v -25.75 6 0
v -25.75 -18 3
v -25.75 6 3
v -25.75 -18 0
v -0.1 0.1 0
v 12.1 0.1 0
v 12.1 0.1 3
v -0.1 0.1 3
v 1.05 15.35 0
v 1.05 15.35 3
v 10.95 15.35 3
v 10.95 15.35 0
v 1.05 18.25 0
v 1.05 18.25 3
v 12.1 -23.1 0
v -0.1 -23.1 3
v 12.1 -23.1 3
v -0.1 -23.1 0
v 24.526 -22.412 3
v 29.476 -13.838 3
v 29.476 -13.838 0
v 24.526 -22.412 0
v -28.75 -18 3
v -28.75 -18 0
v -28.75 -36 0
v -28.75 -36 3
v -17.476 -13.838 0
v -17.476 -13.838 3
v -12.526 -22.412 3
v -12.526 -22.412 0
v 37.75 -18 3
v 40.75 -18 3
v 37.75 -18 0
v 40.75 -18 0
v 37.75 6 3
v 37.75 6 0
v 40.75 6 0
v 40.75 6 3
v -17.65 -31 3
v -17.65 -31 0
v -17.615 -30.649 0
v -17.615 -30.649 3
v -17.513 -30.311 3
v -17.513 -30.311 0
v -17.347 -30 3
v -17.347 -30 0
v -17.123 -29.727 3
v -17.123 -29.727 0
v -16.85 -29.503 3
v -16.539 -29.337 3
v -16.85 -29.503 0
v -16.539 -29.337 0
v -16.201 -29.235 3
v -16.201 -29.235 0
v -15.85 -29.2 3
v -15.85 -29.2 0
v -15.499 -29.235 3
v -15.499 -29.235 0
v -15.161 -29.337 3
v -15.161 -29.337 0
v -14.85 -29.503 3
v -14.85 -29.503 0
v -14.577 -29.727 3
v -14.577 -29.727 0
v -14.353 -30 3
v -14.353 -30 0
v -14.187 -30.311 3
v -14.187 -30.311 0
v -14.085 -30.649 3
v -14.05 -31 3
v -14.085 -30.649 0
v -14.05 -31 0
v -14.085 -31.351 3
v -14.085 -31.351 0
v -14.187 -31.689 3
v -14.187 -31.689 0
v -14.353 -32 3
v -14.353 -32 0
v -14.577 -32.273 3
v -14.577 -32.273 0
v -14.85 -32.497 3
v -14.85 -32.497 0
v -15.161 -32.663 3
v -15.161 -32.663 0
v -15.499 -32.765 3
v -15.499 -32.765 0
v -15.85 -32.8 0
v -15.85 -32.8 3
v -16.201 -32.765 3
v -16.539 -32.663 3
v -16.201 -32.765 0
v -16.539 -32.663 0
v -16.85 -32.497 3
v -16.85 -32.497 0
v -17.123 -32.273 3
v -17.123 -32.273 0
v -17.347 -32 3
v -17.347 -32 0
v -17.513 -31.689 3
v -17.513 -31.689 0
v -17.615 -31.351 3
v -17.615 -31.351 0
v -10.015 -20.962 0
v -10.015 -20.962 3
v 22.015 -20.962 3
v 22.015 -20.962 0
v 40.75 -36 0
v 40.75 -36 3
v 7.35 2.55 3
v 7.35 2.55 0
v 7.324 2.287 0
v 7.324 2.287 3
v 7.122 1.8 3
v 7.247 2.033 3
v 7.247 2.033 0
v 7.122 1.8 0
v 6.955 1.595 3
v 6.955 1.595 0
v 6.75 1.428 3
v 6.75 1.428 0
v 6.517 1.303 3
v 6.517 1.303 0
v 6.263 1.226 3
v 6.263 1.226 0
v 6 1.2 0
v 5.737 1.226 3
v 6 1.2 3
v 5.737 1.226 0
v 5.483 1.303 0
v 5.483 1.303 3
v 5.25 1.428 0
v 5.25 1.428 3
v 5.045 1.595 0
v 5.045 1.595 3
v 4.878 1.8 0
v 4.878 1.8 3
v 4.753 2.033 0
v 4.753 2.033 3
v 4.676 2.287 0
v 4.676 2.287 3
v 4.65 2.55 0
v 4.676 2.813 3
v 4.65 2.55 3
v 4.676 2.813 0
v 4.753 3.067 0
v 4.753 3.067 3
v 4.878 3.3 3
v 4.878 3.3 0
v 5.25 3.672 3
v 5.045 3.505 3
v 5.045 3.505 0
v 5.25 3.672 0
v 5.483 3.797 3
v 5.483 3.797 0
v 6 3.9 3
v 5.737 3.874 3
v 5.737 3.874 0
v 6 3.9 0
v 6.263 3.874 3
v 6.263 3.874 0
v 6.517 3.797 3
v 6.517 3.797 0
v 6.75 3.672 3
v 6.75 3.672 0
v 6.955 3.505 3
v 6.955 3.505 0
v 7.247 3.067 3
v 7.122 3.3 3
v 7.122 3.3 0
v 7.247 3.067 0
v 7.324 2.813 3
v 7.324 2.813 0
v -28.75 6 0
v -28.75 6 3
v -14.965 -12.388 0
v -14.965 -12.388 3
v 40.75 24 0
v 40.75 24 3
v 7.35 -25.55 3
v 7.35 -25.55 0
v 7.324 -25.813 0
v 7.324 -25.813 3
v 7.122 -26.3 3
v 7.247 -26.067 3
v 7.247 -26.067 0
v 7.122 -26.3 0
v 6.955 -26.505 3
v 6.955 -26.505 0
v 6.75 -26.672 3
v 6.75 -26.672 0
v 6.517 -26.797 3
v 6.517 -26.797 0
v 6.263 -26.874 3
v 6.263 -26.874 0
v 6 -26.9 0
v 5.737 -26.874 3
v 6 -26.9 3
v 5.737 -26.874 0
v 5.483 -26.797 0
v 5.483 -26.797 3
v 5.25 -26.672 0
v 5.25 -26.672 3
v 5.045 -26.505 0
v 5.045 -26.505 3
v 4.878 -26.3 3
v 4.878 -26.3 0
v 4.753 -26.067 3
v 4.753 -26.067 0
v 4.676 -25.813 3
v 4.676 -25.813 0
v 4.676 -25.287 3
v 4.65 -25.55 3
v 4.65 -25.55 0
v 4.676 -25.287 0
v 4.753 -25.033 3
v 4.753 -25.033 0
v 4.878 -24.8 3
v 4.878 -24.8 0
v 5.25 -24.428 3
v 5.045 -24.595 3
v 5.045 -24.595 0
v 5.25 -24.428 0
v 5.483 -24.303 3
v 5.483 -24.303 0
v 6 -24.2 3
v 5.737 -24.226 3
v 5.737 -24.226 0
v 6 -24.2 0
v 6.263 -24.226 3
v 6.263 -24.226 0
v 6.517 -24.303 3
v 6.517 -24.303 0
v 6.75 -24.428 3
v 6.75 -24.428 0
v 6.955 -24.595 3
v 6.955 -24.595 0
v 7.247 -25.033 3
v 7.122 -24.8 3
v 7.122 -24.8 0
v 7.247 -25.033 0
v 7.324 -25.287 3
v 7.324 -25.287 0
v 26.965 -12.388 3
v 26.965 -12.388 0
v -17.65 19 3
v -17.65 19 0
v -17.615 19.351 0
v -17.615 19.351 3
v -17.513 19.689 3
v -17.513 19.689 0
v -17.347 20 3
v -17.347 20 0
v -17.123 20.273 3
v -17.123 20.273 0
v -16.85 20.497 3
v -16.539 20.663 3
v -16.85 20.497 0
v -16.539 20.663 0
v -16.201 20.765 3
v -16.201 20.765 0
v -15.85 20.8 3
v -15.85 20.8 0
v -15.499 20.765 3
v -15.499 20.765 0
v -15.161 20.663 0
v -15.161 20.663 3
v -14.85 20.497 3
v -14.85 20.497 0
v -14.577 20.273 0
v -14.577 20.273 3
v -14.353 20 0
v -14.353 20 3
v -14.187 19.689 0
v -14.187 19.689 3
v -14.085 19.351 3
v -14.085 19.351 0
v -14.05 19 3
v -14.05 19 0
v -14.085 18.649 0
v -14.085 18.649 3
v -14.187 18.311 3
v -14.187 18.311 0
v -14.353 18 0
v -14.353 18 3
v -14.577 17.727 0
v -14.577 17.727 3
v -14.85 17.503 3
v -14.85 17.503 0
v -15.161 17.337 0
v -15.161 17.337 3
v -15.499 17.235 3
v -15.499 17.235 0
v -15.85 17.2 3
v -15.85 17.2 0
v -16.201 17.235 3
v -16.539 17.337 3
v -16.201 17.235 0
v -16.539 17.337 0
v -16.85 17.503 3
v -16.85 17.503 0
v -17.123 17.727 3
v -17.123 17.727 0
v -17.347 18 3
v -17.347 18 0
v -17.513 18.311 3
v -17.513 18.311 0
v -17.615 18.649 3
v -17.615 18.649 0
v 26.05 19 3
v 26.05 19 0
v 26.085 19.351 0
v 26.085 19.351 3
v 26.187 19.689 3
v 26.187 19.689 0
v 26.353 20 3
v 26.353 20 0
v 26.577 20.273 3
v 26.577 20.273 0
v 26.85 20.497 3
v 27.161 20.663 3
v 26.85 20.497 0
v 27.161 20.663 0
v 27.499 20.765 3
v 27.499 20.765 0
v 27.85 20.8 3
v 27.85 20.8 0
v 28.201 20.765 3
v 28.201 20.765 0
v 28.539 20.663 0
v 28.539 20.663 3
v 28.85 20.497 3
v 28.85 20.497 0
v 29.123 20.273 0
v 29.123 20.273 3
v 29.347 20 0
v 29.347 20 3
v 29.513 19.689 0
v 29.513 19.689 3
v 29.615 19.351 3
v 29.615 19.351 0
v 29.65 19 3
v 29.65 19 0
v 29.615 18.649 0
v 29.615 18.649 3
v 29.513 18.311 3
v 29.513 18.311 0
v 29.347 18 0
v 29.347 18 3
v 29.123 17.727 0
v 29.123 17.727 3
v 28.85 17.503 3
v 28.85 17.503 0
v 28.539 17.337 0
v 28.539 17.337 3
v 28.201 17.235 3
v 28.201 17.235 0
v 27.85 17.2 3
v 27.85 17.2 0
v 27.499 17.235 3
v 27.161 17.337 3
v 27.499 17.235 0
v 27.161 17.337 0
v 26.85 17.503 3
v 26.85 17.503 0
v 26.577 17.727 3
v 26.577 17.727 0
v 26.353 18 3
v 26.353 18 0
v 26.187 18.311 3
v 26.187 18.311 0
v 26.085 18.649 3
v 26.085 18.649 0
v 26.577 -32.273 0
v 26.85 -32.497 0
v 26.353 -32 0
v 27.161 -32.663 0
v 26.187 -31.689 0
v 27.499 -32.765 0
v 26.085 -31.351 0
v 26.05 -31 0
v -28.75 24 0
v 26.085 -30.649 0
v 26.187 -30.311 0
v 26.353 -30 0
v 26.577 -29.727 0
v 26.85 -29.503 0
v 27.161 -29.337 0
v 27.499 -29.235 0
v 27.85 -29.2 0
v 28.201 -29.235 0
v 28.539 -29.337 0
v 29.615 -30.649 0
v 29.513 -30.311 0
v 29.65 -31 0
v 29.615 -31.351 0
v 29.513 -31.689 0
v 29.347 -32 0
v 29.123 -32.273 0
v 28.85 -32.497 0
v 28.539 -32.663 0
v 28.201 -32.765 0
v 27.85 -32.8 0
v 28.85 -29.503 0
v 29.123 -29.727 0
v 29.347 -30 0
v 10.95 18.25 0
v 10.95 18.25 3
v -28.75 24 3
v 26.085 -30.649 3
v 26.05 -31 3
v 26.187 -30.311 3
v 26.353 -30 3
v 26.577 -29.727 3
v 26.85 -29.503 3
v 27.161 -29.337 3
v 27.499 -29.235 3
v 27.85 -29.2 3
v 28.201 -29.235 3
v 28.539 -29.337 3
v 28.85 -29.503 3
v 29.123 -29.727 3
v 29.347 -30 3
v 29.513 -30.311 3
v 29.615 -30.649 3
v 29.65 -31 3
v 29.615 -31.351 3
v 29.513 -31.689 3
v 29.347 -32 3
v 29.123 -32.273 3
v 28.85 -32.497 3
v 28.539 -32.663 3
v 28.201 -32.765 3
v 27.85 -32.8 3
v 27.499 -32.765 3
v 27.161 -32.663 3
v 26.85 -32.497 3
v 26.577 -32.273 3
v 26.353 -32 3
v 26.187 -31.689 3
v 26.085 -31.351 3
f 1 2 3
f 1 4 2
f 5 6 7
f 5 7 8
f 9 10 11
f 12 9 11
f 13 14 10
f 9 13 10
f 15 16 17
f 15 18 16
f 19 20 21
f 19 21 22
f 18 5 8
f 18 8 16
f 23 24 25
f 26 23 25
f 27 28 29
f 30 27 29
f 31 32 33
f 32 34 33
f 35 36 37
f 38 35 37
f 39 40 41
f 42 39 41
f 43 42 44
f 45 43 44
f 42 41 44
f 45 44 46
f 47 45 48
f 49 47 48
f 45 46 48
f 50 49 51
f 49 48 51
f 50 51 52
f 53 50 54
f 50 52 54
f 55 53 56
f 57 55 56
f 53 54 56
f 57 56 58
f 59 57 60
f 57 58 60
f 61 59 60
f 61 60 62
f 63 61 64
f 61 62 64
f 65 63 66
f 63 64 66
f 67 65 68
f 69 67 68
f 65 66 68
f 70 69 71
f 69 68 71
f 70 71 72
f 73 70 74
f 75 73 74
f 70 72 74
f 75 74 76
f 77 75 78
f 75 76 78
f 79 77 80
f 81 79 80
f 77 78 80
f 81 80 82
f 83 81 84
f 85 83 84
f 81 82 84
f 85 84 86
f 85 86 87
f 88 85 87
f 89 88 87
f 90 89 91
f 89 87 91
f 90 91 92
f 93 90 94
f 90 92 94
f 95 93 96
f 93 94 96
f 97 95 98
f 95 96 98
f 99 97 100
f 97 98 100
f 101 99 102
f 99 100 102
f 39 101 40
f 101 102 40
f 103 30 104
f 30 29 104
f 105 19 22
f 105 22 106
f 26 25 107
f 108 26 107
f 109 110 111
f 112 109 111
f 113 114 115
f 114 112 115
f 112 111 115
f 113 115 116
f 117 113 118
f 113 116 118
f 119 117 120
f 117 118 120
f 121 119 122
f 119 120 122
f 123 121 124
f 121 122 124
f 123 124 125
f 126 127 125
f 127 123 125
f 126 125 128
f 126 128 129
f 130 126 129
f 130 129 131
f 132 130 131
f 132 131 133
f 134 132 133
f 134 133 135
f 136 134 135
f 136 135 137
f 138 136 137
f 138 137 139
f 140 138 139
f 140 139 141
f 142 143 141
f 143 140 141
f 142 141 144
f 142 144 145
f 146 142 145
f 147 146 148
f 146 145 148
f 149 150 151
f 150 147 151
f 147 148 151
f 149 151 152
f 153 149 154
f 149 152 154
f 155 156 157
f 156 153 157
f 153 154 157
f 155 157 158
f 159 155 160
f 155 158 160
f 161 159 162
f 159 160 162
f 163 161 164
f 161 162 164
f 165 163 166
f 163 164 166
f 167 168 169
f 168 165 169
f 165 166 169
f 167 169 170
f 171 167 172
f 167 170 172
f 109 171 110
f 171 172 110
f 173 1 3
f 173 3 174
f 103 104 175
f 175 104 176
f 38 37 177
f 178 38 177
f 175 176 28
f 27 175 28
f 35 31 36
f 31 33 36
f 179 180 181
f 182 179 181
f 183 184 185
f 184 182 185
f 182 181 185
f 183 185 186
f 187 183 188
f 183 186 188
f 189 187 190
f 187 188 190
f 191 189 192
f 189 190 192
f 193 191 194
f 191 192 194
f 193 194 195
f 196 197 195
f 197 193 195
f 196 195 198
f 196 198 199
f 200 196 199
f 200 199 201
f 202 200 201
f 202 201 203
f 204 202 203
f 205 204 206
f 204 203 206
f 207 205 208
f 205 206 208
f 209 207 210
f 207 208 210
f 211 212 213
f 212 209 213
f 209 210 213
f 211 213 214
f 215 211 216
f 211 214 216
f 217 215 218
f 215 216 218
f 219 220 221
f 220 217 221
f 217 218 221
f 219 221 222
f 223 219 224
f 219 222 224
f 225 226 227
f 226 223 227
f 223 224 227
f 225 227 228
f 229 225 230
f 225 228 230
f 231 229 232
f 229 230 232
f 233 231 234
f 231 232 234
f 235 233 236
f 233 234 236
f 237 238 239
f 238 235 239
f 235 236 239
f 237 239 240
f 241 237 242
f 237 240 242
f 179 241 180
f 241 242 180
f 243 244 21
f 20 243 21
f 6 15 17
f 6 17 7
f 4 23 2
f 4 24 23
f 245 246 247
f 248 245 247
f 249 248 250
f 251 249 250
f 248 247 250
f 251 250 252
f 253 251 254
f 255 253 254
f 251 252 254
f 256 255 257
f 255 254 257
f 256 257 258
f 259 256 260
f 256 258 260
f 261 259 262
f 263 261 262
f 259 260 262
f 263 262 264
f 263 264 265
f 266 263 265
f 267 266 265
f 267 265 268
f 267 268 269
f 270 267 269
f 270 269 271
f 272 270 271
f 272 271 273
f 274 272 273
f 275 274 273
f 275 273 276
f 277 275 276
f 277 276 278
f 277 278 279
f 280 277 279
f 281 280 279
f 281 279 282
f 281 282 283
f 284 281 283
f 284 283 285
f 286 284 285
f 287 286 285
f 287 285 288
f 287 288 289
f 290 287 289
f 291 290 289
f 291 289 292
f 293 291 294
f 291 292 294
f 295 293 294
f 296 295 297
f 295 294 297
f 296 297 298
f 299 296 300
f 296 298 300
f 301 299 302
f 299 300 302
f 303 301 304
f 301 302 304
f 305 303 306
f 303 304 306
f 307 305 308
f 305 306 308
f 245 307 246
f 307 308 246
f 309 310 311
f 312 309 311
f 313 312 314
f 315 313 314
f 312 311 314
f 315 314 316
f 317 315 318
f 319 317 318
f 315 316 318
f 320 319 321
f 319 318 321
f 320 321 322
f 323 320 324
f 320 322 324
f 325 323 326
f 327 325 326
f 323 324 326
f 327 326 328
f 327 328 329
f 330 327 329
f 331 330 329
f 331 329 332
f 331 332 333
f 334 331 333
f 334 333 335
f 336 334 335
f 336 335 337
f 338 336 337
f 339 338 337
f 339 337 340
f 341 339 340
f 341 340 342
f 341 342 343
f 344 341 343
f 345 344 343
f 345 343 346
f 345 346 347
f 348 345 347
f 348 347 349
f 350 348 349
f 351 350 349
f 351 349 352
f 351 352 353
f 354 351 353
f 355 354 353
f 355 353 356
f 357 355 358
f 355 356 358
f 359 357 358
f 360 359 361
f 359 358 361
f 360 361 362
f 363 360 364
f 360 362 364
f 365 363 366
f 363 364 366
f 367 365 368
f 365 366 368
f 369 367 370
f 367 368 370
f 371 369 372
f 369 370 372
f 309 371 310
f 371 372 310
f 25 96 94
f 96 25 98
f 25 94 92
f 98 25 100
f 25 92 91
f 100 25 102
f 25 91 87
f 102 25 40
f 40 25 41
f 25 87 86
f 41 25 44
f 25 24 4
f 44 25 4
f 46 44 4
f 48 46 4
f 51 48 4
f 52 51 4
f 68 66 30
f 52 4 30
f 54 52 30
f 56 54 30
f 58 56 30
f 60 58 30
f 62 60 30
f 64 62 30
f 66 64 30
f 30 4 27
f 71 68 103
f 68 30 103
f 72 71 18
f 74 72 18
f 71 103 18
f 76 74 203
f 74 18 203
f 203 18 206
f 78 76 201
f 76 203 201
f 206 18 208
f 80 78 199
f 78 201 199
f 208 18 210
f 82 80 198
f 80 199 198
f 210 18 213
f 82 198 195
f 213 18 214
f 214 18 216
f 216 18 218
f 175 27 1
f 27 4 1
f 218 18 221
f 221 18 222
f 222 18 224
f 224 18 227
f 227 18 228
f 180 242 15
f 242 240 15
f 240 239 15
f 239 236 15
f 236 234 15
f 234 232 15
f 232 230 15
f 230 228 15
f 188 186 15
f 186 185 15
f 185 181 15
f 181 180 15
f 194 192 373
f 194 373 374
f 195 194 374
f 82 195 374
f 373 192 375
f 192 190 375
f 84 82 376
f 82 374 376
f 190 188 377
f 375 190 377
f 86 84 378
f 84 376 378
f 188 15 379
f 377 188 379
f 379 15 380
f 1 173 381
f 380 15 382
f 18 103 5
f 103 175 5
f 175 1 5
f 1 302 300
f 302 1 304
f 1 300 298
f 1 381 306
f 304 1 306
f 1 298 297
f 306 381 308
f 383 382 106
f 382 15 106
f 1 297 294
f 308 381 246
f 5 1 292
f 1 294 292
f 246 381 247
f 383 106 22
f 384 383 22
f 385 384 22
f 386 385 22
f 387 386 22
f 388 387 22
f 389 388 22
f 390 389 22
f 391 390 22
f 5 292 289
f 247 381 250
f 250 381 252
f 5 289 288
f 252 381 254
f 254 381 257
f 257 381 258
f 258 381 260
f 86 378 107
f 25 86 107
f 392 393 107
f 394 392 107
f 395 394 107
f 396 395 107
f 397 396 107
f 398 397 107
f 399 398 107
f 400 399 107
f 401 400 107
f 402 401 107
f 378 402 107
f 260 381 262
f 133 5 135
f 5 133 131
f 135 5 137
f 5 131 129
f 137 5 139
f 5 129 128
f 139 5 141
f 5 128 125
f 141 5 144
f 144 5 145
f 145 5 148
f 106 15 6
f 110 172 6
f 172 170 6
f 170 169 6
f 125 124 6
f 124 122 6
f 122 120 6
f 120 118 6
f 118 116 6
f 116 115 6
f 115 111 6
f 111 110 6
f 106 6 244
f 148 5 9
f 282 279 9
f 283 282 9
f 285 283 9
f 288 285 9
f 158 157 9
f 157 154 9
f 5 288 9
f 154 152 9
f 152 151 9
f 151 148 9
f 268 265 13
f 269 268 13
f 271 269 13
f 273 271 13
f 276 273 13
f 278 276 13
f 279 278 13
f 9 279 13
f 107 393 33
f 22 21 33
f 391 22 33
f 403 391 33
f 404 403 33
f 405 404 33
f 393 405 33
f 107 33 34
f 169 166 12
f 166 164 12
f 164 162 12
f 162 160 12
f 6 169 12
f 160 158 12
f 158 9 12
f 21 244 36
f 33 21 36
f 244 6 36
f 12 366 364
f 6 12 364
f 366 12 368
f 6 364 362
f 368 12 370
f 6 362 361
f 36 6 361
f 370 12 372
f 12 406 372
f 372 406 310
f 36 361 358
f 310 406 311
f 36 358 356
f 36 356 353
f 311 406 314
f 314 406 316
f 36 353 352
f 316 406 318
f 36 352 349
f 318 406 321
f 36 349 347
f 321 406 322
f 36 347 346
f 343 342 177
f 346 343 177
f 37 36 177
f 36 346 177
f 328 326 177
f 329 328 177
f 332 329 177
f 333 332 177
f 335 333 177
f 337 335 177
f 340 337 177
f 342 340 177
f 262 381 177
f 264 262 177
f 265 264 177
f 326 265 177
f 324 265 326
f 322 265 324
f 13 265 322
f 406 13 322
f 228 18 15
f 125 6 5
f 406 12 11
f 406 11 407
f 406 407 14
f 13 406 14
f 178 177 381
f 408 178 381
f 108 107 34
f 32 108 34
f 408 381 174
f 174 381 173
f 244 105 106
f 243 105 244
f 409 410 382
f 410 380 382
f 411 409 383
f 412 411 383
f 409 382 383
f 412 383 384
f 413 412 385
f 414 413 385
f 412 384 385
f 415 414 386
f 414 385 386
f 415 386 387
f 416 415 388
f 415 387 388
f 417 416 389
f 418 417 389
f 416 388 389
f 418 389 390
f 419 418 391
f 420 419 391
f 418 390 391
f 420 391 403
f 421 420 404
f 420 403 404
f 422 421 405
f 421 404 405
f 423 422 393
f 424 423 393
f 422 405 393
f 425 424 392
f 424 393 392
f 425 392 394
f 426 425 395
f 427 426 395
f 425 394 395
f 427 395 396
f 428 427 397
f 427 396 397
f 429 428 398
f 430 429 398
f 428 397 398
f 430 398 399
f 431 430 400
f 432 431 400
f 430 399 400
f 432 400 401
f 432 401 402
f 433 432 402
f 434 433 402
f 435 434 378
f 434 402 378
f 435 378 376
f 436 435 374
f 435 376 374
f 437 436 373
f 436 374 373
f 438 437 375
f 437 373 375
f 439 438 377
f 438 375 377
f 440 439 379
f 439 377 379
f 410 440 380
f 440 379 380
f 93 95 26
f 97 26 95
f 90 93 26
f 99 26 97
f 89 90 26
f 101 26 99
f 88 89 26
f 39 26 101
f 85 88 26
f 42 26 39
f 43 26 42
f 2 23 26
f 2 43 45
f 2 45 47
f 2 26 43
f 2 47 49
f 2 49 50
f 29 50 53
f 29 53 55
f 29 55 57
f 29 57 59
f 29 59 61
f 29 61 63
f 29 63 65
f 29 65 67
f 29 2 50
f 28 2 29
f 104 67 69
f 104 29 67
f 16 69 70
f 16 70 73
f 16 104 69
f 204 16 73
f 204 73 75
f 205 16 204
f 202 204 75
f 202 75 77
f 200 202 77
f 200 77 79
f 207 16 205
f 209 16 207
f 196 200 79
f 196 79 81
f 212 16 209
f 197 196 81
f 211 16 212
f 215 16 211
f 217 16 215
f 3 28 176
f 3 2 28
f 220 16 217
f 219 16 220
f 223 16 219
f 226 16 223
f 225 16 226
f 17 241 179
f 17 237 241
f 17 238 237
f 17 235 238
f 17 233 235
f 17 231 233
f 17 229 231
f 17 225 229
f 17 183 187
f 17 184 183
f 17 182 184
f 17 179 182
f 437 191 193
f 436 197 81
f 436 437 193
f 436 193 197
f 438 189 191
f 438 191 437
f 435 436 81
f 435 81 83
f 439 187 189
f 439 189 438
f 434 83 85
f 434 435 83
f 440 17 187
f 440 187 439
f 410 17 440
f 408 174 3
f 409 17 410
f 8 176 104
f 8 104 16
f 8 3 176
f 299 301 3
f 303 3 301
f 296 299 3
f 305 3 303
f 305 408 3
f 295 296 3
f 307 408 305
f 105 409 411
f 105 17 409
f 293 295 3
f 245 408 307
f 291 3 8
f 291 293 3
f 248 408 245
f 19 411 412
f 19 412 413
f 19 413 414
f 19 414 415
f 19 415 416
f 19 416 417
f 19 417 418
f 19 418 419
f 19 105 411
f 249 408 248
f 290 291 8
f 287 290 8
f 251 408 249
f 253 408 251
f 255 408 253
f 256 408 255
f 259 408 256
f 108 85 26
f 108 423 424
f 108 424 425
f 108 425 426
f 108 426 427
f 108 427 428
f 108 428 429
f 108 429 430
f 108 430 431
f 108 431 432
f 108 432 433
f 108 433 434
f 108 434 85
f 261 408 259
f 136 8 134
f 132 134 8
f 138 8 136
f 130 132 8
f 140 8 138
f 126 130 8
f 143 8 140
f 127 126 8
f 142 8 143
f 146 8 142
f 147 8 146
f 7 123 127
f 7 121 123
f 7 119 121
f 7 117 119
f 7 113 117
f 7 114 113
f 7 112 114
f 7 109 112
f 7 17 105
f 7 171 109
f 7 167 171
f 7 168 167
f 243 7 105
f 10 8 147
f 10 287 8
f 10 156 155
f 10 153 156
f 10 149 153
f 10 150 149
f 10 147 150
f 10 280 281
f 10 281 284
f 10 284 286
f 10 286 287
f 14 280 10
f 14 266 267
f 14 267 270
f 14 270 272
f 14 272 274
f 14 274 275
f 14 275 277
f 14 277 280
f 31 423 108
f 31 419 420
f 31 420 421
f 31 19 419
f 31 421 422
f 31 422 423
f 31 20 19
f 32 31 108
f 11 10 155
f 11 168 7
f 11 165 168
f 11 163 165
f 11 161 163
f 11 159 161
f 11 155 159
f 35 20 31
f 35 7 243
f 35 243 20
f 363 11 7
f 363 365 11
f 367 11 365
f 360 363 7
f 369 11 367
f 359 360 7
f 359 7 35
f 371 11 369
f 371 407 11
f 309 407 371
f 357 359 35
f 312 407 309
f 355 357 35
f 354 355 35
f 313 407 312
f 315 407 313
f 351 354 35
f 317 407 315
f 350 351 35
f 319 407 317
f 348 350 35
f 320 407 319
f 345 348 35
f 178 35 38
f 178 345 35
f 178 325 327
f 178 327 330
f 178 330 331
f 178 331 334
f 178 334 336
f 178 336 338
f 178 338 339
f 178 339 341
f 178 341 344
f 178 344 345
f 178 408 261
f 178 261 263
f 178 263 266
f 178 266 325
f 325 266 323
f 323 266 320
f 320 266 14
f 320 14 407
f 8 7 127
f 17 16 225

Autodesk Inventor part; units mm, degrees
ref_plane "YZ Plane" through (0, 0, 0) normal (1, 0, 0) x (0, 1, 0)
ref_plane "XZ Plane" through (0, 0, 0) normal (0, 1, 0) x (-1, 0, 0)
ref_plane "XY Plane" through (0, 0, 0) normal (0, 0, 1) x (1, 0, 0)
sketch "Sketch1" plane through (0, 0, 0) normal (0, 0, 1) x (1, 0, 0)
  arc A0 (8.3864, -11.505) -> (3.6136, -11.505) centre (6, -6) ccw construction
  line L0 (-28.75, -36) -> (40.75, -36)
  line L1 (40.75, -36) -> (40.75, 24)
  line L2 (40.75, 24) -> (-28.75, 24)
  line L3 (-28.75, 24) -> (-28.75, -36)
  line L4 (-28.75, -36) -> (40.75, 24) construction
  line L5 (40.75, -36) -> (-28.75, 24) construction
  line L6 (12, 0) -> (0, 0) projected
  line L7 (0, 0) -> (0, -23) projected
  line L8 (0, -23) -> (12, -23) projected
  line L9 (12, -23) -> (12, 0) projected
  line L10 (-0.1, -23.1) -> (12.1, -23.1)
  line L11 (12.1, -23.1) -> (12.1, 0.1)
  line L12 (12.1, 0.1) -> (-0.1, 0.1)
  line L13 (-0.1, 0.1) -> (-0.1, -23.1)
  line L14 (-28.75, -6) -> (40.75, -6) construction
  line L15 (6, -36) -> (6, 24) construction
  line L16 (-28.75, -18) -> (-25.75, -18)
  line L17 (-25.75, -18) -> (-25.75, 6)
  line L18 (-25.75, 6) -> (-28.75, 6)
  line L19 (-28.75, 6) -> (-28.75, -18)
  line L20 (40.75, -18) -> (37.75, -18)
  line L21 (37.75, -18) -> (37.75, 6)
  line L22 (37.75, 6) -> (40.75, 6)
  line L23 (40.75, 6) -> (40.75, -18)
  arc A1 (6.5, -26.804) -> (5.5, -26.804) centre (6, -25.55) ccw construction
  arc A2 (5.5, 3.804) -> (6.5, 3.804) centre (6, 2.55) ccw construction
  circle A3 centre (6, -25.55) radius 1.35
  circle A4 centre (6, 2.55) radius 1.35
  dimension "d0" = 69.5
  dimension "d1" = 60
  dimension "d2" = 0.1
  dimension "d3" = 0.1
  dimension "d4" = 0.1
  dimension "d5" = 0.1
  dimension "d6" = 12
  dimension "d7" = 12
  dimension "d8" = 3
extrude "Extrusion1" add sketch "Sketch1" along normal blind 3 contours L3 L16 L17 L18 L2 L1 L22 L21 L20 L0
sketch "Sketch2" plane through (0, 0, 0) normal (0, 0, -1) x (-1, 0, 0)
  circle A0 centre (15.85, 19) radius 1.8 projected
  circle A1 centre (-27.85, 19) radius 1.8 projected
  circle A2 centre (-27.85, -31) radius 1.8 projected
  circle A3 centre (15.85, -31) radius 1.8 projected
  point P0 (0, 0)
extrude "Extrusion2" cut sketch "Sketch2" against normal blind 7.7625
sketch "Sketch3" plane through (0, 0, 3) normal (0, 0, 1) x (1, 0, 0)
  line L0 (-14.9463, -12.3199) -> (-9.9463, -20.9801) construction
  line L1 (-17.5444, -13.8199) -> (-12.5444, -22.4801) construction
  line L2 (-12.5444, -22.4801) -> (-9.9463, -20.9801) construction
  line L3 (-17.5444, -13.8199) -> (-14.9463, -12.3199) construction
  line L4 (29.5444, -13.8199) -> (26.9463, -12.3199) construction
  line L5 (24.5444, -22.4801) -> (21.9463, -20.9801) construction
  line L6 (21.9463, -20.9801) -> (26.9463, -12.3199) construction
  line L7 (24.5444, -22.4801) -> (29.5444, -13.8199) construction
  line L8 (11, 15.3) -> (1, 15.3) construction
  line L9 (11, 18.3) -> (1, 18.3) construction
  line L10 (11, 18.3) -> (11, 15.3) construction
  line L11 (1, 18.3) -> (1, 15.3) construction
  line L12 (26.9646, -12.3882) -> (29.4761, -13.8382)
  line L13 (29.4761, -13.8382) -> (24.5261, -22.4118)
  line L14 (24.5261, -22.4118) -> (22.0146, -20.9618)
  line L15 (22.0146, -20.9618) -> (26.9646, -12.3882)
  line L16 (-10.0146, -20.9618) -> (-14.9646, -12.3882)
  line L17 (-14.9646, -12.3882) -> (-17.4761, -13.8382)
  line L18 (-17.4761, -13.8382) -> (-12.5261, -22.4118)
  line L19 (-12.5261, -22.4118) -> (-10.0146, -20.9618)
  line L20 (1.05, 15.35) -> (10.95, 15.35)
  line L21 (10.95, 15.35) -> (10.95, 18.25)
  line L22 (10.95, 18.25) -> (1.05, 18.25)
  line L23 (1.05, 18.25) -> (1.05, 15.35)
  point P0 (0, 0)
  dimension "d13" = 0.05
  dimension "d14" = 0.05
  dimension "d15" = 0.05
extrude "Extrusion3" cut sketch "Sketch3" against normal blind 10
properties part number "Camera pan base"
